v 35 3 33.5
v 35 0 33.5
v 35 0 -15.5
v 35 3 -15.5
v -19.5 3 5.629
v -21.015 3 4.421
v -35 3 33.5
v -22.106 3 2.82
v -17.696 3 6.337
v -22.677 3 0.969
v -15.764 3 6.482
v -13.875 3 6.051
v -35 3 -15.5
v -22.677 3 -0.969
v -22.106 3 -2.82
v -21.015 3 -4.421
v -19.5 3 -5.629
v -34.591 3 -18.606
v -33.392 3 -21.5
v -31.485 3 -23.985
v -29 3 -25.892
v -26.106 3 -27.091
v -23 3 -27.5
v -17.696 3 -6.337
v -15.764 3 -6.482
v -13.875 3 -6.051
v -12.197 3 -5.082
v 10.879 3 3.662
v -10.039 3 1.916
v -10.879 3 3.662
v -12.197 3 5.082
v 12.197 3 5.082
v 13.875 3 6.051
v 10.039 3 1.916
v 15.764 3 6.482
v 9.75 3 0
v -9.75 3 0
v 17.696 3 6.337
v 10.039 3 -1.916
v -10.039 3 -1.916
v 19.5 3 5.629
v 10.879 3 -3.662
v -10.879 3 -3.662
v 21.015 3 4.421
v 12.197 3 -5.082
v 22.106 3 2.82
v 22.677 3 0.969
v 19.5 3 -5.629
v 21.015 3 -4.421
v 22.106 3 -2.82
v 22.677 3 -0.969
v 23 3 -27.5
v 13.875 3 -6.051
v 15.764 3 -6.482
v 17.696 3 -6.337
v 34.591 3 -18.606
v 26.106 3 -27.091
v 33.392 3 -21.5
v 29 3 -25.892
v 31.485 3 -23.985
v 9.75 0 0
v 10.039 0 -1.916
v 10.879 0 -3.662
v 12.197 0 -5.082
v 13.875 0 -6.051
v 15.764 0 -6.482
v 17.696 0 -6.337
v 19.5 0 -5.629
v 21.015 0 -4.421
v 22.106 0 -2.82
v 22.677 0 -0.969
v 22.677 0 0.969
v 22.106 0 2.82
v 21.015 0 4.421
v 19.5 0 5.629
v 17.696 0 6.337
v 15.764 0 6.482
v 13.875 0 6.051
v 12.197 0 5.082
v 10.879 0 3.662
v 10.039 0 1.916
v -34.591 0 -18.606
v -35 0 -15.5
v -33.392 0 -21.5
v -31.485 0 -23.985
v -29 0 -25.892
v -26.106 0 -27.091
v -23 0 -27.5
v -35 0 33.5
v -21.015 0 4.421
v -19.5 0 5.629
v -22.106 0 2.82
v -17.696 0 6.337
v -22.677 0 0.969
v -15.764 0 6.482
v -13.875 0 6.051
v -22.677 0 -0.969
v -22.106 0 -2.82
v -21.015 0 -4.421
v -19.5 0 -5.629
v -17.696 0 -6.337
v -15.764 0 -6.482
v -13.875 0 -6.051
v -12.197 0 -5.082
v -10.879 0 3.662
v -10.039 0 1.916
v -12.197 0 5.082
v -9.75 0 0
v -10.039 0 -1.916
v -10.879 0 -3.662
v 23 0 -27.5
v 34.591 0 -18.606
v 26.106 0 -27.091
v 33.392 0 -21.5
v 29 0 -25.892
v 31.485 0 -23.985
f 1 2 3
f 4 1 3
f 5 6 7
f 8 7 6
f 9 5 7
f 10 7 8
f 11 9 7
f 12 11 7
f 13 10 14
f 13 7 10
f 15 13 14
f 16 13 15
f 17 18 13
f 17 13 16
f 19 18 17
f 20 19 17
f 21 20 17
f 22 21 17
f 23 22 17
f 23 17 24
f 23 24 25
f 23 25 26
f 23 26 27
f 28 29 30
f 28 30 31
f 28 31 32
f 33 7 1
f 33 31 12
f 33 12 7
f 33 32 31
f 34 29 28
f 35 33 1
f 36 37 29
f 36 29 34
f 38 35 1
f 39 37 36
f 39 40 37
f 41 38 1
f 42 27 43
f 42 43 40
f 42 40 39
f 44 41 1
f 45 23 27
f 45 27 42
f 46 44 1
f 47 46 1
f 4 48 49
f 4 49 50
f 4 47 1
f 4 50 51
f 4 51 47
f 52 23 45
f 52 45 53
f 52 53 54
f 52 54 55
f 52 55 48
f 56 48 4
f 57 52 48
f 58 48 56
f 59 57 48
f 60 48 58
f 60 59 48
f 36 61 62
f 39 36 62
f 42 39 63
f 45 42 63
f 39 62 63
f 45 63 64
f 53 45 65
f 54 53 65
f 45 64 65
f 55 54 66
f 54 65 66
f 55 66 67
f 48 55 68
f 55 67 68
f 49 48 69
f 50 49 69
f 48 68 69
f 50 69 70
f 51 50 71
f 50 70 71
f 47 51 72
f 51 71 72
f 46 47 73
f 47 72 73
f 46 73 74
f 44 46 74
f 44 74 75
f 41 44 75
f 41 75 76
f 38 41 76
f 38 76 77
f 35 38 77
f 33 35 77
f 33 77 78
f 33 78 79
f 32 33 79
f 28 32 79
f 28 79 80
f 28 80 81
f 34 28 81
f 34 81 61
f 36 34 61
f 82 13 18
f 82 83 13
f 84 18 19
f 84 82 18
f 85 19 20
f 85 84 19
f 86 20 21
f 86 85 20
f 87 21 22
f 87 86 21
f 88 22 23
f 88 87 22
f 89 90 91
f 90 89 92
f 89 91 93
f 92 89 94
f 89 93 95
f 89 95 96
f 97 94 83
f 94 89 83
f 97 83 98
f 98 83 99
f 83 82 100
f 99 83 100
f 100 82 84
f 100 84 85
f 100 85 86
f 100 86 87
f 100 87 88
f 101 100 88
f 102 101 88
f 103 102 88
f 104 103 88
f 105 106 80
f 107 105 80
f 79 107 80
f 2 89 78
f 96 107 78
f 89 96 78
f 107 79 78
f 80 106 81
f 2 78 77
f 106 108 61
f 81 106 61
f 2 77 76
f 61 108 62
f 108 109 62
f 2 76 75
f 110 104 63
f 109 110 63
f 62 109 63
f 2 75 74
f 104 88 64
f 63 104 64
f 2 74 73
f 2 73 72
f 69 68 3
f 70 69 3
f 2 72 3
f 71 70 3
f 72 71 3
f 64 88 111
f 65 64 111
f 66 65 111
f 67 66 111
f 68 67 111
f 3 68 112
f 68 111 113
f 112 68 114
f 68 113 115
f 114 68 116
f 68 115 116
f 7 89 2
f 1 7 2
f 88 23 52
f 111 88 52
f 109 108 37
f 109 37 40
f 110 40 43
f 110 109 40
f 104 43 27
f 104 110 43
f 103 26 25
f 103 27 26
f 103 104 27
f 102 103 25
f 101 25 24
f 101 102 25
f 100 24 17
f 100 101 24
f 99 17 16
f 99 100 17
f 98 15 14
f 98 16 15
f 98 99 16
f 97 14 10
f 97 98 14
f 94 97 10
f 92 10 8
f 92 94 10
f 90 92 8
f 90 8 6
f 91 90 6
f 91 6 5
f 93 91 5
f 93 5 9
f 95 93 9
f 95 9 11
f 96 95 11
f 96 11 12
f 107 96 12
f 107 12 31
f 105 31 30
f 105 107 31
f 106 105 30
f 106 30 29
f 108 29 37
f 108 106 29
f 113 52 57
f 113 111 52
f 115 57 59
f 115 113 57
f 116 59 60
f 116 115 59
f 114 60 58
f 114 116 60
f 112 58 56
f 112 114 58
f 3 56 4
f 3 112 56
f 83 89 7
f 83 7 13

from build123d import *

# Parameters (mm, degrees)
SKETCH1_W               = 70
SKETCH1_H               = 67
BOSS_EXTRUDE1_DEPTH     = 3
SKETCH5_W               = 70
SKETCH5_H               = 6
CUT_EXTRUDE4_DEPTH      = 1
CUT_EXTRUDE4_DEPTH_BACK = 4
FILLET1_R               = 12
CUT_EXTRUDE1_START      = -4
SKETCH2_R               = 6.5
CUT_EXTRUDE1_DEPTH      = 5


with BuildPart() as part:
    # Sketch1 → Boss-Extrude1 (new body)
    with BuildSketch(Plane(origin=(0, 0, 0), x_dir=(1, 0, 0), z_dir=(0, 1, 0))):
        Rectangle(SKETCH1_W, SKETCH1_H)
    extrude(amount=BOSS_EXTRUDE1_DEPTH)

    # Sketch5 → Cut-Extrude4 (cut, two sides)
    with BuildSketch(Plane(origin=(0, 3, 0), x_dir=(1, 0, 0), z_dir=(0, 1, 0))) as cut_extrude4_sk:
        with Locations((0, 30.5)):
            Rectangle(SKETCH5_W, SKETCH5_H)
    extrude(amount=CUT_EXTRUDE4_DEPTH, mode=Mode.SUBTRACT)
    extrude(cut_extrude4_sk.sketch, amount=-CUT_EXTRUDE4_DEPTH_BACK, mode=Mode.SUBTRACT)

    # Fillet1
    fillet1_edges = [part.edges().sort_by_distance(p)[0] for p in [
        (-35, 1.5, -27.5),
        (35, 1.5, -27.5),
    ]]
    fillet(fillet1_edges, radius=FILLET1_R)

    # Sketch2 → Cut-Extrude1 (cut)
    with BuildSketch(Plane(origin=(0, 3, 0), x_dir=(1, 0, 0), z_dir=(0, 1, 0)).offset(CUT_EXTRUDE1_START)):
        with Locations((-16.25, 0)):
            Circle(SKETCH2_R)
    cut_extrude1 = extrude(amount=CUT_EXTRUDE1_DEPTH, mode=Mode.SUBTRACT)

    # Mirror1: Cut-Extrude1 across plane
    add(cut_extrude1.mirror(Plane(origin=(0, 0, 0), x_dir=(0, 0, 1), z_dir=(1, 0, 0))), mode=Mode.SUBTRACT)


solid = part.part
